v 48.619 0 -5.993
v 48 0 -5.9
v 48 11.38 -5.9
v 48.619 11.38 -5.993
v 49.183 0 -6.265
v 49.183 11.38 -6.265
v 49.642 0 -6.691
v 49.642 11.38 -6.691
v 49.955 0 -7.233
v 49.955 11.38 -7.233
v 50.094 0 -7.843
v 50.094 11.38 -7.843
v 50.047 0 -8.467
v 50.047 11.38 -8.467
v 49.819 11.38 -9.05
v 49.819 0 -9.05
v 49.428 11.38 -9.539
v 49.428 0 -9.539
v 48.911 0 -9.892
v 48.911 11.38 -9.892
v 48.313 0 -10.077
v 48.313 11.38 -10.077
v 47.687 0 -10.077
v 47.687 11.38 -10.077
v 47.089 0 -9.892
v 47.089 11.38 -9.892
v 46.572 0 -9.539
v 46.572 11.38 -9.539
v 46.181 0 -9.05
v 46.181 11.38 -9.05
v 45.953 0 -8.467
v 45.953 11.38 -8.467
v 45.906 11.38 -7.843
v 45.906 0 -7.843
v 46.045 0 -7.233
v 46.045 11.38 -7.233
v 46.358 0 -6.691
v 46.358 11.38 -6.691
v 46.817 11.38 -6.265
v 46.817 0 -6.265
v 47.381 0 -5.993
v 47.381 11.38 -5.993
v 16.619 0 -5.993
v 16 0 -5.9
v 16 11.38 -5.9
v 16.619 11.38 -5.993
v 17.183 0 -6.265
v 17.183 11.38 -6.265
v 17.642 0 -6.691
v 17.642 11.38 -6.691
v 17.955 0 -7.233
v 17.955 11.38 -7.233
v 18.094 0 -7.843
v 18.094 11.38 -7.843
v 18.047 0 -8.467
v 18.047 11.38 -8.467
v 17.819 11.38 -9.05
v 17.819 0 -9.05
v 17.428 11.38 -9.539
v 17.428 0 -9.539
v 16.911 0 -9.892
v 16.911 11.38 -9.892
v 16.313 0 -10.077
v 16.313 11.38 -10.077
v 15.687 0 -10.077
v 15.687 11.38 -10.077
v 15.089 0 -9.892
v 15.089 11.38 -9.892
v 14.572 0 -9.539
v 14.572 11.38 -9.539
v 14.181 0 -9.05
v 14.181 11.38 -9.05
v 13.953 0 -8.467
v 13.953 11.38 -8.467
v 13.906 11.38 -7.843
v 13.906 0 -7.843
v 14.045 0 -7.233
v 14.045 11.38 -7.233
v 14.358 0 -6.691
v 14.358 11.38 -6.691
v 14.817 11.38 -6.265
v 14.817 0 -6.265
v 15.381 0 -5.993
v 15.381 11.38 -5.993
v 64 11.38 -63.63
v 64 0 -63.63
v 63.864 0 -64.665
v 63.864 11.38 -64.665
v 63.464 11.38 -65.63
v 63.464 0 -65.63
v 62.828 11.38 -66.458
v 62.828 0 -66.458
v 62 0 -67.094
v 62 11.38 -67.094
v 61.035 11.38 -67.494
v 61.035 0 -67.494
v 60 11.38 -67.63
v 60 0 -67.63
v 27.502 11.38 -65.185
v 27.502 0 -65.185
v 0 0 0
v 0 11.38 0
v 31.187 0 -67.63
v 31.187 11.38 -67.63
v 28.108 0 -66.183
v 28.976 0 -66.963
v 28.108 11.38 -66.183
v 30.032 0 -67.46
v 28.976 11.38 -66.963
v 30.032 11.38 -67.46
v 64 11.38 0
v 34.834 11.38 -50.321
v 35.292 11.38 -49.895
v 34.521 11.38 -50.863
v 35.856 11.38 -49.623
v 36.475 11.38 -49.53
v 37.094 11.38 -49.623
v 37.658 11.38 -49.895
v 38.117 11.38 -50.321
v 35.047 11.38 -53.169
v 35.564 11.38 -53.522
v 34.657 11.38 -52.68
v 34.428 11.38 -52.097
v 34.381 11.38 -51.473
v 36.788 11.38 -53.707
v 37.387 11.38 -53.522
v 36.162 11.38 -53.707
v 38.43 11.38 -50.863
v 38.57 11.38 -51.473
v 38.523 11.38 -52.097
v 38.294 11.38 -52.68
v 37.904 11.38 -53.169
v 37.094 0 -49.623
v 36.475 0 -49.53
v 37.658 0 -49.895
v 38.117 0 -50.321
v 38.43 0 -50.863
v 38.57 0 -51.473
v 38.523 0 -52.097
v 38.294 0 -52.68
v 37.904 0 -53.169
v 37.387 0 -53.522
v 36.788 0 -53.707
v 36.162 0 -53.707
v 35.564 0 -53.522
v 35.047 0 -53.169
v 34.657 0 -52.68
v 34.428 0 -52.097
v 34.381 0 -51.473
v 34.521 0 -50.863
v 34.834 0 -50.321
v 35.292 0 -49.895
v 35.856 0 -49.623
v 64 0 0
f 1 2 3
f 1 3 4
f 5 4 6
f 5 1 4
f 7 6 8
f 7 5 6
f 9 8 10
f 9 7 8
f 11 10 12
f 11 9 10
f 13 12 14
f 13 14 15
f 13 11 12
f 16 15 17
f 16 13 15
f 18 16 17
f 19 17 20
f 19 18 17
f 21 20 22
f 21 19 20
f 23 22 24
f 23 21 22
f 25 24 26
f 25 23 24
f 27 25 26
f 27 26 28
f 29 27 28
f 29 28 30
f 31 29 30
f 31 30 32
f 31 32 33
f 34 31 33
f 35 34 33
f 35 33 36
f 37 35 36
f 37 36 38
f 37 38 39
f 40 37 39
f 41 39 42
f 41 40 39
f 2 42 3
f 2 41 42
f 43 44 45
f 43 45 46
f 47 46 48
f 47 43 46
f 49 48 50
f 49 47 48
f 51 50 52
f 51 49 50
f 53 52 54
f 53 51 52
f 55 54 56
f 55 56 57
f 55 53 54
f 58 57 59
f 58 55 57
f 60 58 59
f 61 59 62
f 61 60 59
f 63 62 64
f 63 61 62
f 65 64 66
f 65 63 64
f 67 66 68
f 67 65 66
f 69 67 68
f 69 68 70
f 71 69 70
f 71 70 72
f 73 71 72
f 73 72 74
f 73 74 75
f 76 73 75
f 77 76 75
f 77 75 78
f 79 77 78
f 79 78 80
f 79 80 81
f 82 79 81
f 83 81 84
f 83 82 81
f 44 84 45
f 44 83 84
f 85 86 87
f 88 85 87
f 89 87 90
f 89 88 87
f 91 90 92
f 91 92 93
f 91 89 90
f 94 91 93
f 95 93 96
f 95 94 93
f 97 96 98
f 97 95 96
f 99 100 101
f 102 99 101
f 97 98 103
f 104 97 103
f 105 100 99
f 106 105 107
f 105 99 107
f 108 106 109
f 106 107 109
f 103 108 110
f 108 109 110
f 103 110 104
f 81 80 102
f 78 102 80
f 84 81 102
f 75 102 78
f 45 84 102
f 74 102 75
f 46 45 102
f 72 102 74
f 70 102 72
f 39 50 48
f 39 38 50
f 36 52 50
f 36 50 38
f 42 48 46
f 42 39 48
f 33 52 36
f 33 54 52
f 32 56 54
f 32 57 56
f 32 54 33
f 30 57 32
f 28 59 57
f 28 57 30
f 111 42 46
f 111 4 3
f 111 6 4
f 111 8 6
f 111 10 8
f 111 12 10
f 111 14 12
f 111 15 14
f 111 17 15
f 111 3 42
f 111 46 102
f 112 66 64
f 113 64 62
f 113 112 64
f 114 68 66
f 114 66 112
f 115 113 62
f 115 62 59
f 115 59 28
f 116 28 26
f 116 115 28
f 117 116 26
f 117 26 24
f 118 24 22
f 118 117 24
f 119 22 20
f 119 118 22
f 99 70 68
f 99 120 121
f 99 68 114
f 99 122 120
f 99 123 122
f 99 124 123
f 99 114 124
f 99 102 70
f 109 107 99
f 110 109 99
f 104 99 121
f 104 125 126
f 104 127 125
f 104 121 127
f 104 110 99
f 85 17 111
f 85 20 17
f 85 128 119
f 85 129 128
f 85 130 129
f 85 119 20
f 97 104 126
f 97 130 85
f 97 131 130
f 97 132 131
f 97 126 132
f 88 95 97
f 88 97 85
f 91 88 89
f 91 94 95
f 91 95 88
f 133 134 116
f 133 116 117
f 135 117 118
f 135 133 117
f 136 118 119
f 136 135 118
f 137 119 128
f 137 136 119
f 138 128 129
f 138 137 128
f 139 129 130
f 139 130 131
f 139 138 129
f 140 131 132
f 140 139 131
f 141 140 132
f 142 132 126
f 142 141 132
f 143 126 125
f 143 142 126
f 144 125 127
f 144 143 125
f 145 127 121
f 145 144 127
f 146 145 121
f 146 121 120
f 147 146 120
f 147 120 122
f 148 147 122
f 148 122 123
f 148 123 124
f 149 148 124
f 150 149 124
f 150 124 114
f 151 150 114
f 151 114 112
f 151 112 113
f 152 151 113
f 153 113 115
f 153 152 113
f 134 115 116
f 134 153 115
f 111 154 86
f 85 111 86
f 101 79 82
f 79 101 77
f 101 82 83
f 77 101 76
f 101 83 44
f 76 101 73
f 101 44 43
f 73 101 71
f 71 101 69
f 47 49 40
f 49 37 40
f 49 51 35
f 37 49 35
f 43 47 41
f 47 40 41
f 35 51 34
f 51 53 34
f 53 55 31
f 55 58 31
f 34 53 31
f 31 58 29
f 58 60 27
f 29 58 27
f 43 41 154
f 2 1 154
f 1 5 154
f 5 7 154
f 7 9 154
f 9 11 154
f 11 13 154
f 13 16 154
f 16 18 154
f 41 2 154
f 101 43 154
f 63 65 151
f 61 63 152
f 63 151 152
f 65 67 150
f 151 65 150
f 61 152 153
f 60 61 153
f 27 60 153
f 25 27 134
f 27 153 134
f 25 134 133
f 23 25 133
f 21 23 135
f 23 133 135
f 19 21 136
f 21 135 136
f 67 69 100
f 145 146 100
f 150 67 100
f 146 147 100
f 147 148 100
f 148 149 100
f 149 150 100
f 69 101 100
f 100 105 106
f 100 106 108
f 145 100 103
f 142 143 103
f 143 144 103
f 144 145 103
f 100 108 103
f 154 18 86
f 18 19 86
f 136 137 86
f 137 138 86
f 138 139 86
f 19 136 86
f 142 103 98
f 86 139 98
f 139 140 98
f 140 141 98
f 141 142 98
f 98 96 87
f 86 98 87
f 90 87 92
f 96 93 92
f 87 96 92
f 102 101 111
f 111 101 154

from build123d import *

# Parameters (mm, degrees)
SKETCH1_R           = 2.1
BOSS_EXTRUDE1_DEPTH = 11.38
FILLET1_R           = 4


with BuildPart() as part:
    # Sketch1 → Boss-Extrude1 (new body)
    with BuildSketch(Plane(origin=(0, 0, 0), x_dir=(1, 0, 0), z_dir=(0, 1, 0))):
        Polygon((0, 0), (64, 0), (64, 67.63), (28.533540344, 67.63), align=None)
        with Locations(Location((16, 8, 0), (0, 0, 270))):
            Circle(SKETCH1_R, mode=Mode.SUBTRACT)
        with Locations(Location((48, 8, 0), (0, 0, 270))):
            Circle(SKETCH1_R, mode=Mode.SUBTRACT)
        with Locations(Location((36.475395885, 51.63, 0), (0, 0, 270))):
            Circle(SKETCH1_R, mode=Mode.SUBTRACT)
    extrude(amount=BOSS_EXTRUDE1_DEPTH)

    # Fillet1
    fillet1_edges = [part.edges().sort_by_distance(p)[0] for p in [
        (28.533540344, 5.69, -67.63),
        (64, 5.69, -67.63),
    ]]
    fillet(fillet1_edges, radius=FILLET1_R)


solid = part.part
